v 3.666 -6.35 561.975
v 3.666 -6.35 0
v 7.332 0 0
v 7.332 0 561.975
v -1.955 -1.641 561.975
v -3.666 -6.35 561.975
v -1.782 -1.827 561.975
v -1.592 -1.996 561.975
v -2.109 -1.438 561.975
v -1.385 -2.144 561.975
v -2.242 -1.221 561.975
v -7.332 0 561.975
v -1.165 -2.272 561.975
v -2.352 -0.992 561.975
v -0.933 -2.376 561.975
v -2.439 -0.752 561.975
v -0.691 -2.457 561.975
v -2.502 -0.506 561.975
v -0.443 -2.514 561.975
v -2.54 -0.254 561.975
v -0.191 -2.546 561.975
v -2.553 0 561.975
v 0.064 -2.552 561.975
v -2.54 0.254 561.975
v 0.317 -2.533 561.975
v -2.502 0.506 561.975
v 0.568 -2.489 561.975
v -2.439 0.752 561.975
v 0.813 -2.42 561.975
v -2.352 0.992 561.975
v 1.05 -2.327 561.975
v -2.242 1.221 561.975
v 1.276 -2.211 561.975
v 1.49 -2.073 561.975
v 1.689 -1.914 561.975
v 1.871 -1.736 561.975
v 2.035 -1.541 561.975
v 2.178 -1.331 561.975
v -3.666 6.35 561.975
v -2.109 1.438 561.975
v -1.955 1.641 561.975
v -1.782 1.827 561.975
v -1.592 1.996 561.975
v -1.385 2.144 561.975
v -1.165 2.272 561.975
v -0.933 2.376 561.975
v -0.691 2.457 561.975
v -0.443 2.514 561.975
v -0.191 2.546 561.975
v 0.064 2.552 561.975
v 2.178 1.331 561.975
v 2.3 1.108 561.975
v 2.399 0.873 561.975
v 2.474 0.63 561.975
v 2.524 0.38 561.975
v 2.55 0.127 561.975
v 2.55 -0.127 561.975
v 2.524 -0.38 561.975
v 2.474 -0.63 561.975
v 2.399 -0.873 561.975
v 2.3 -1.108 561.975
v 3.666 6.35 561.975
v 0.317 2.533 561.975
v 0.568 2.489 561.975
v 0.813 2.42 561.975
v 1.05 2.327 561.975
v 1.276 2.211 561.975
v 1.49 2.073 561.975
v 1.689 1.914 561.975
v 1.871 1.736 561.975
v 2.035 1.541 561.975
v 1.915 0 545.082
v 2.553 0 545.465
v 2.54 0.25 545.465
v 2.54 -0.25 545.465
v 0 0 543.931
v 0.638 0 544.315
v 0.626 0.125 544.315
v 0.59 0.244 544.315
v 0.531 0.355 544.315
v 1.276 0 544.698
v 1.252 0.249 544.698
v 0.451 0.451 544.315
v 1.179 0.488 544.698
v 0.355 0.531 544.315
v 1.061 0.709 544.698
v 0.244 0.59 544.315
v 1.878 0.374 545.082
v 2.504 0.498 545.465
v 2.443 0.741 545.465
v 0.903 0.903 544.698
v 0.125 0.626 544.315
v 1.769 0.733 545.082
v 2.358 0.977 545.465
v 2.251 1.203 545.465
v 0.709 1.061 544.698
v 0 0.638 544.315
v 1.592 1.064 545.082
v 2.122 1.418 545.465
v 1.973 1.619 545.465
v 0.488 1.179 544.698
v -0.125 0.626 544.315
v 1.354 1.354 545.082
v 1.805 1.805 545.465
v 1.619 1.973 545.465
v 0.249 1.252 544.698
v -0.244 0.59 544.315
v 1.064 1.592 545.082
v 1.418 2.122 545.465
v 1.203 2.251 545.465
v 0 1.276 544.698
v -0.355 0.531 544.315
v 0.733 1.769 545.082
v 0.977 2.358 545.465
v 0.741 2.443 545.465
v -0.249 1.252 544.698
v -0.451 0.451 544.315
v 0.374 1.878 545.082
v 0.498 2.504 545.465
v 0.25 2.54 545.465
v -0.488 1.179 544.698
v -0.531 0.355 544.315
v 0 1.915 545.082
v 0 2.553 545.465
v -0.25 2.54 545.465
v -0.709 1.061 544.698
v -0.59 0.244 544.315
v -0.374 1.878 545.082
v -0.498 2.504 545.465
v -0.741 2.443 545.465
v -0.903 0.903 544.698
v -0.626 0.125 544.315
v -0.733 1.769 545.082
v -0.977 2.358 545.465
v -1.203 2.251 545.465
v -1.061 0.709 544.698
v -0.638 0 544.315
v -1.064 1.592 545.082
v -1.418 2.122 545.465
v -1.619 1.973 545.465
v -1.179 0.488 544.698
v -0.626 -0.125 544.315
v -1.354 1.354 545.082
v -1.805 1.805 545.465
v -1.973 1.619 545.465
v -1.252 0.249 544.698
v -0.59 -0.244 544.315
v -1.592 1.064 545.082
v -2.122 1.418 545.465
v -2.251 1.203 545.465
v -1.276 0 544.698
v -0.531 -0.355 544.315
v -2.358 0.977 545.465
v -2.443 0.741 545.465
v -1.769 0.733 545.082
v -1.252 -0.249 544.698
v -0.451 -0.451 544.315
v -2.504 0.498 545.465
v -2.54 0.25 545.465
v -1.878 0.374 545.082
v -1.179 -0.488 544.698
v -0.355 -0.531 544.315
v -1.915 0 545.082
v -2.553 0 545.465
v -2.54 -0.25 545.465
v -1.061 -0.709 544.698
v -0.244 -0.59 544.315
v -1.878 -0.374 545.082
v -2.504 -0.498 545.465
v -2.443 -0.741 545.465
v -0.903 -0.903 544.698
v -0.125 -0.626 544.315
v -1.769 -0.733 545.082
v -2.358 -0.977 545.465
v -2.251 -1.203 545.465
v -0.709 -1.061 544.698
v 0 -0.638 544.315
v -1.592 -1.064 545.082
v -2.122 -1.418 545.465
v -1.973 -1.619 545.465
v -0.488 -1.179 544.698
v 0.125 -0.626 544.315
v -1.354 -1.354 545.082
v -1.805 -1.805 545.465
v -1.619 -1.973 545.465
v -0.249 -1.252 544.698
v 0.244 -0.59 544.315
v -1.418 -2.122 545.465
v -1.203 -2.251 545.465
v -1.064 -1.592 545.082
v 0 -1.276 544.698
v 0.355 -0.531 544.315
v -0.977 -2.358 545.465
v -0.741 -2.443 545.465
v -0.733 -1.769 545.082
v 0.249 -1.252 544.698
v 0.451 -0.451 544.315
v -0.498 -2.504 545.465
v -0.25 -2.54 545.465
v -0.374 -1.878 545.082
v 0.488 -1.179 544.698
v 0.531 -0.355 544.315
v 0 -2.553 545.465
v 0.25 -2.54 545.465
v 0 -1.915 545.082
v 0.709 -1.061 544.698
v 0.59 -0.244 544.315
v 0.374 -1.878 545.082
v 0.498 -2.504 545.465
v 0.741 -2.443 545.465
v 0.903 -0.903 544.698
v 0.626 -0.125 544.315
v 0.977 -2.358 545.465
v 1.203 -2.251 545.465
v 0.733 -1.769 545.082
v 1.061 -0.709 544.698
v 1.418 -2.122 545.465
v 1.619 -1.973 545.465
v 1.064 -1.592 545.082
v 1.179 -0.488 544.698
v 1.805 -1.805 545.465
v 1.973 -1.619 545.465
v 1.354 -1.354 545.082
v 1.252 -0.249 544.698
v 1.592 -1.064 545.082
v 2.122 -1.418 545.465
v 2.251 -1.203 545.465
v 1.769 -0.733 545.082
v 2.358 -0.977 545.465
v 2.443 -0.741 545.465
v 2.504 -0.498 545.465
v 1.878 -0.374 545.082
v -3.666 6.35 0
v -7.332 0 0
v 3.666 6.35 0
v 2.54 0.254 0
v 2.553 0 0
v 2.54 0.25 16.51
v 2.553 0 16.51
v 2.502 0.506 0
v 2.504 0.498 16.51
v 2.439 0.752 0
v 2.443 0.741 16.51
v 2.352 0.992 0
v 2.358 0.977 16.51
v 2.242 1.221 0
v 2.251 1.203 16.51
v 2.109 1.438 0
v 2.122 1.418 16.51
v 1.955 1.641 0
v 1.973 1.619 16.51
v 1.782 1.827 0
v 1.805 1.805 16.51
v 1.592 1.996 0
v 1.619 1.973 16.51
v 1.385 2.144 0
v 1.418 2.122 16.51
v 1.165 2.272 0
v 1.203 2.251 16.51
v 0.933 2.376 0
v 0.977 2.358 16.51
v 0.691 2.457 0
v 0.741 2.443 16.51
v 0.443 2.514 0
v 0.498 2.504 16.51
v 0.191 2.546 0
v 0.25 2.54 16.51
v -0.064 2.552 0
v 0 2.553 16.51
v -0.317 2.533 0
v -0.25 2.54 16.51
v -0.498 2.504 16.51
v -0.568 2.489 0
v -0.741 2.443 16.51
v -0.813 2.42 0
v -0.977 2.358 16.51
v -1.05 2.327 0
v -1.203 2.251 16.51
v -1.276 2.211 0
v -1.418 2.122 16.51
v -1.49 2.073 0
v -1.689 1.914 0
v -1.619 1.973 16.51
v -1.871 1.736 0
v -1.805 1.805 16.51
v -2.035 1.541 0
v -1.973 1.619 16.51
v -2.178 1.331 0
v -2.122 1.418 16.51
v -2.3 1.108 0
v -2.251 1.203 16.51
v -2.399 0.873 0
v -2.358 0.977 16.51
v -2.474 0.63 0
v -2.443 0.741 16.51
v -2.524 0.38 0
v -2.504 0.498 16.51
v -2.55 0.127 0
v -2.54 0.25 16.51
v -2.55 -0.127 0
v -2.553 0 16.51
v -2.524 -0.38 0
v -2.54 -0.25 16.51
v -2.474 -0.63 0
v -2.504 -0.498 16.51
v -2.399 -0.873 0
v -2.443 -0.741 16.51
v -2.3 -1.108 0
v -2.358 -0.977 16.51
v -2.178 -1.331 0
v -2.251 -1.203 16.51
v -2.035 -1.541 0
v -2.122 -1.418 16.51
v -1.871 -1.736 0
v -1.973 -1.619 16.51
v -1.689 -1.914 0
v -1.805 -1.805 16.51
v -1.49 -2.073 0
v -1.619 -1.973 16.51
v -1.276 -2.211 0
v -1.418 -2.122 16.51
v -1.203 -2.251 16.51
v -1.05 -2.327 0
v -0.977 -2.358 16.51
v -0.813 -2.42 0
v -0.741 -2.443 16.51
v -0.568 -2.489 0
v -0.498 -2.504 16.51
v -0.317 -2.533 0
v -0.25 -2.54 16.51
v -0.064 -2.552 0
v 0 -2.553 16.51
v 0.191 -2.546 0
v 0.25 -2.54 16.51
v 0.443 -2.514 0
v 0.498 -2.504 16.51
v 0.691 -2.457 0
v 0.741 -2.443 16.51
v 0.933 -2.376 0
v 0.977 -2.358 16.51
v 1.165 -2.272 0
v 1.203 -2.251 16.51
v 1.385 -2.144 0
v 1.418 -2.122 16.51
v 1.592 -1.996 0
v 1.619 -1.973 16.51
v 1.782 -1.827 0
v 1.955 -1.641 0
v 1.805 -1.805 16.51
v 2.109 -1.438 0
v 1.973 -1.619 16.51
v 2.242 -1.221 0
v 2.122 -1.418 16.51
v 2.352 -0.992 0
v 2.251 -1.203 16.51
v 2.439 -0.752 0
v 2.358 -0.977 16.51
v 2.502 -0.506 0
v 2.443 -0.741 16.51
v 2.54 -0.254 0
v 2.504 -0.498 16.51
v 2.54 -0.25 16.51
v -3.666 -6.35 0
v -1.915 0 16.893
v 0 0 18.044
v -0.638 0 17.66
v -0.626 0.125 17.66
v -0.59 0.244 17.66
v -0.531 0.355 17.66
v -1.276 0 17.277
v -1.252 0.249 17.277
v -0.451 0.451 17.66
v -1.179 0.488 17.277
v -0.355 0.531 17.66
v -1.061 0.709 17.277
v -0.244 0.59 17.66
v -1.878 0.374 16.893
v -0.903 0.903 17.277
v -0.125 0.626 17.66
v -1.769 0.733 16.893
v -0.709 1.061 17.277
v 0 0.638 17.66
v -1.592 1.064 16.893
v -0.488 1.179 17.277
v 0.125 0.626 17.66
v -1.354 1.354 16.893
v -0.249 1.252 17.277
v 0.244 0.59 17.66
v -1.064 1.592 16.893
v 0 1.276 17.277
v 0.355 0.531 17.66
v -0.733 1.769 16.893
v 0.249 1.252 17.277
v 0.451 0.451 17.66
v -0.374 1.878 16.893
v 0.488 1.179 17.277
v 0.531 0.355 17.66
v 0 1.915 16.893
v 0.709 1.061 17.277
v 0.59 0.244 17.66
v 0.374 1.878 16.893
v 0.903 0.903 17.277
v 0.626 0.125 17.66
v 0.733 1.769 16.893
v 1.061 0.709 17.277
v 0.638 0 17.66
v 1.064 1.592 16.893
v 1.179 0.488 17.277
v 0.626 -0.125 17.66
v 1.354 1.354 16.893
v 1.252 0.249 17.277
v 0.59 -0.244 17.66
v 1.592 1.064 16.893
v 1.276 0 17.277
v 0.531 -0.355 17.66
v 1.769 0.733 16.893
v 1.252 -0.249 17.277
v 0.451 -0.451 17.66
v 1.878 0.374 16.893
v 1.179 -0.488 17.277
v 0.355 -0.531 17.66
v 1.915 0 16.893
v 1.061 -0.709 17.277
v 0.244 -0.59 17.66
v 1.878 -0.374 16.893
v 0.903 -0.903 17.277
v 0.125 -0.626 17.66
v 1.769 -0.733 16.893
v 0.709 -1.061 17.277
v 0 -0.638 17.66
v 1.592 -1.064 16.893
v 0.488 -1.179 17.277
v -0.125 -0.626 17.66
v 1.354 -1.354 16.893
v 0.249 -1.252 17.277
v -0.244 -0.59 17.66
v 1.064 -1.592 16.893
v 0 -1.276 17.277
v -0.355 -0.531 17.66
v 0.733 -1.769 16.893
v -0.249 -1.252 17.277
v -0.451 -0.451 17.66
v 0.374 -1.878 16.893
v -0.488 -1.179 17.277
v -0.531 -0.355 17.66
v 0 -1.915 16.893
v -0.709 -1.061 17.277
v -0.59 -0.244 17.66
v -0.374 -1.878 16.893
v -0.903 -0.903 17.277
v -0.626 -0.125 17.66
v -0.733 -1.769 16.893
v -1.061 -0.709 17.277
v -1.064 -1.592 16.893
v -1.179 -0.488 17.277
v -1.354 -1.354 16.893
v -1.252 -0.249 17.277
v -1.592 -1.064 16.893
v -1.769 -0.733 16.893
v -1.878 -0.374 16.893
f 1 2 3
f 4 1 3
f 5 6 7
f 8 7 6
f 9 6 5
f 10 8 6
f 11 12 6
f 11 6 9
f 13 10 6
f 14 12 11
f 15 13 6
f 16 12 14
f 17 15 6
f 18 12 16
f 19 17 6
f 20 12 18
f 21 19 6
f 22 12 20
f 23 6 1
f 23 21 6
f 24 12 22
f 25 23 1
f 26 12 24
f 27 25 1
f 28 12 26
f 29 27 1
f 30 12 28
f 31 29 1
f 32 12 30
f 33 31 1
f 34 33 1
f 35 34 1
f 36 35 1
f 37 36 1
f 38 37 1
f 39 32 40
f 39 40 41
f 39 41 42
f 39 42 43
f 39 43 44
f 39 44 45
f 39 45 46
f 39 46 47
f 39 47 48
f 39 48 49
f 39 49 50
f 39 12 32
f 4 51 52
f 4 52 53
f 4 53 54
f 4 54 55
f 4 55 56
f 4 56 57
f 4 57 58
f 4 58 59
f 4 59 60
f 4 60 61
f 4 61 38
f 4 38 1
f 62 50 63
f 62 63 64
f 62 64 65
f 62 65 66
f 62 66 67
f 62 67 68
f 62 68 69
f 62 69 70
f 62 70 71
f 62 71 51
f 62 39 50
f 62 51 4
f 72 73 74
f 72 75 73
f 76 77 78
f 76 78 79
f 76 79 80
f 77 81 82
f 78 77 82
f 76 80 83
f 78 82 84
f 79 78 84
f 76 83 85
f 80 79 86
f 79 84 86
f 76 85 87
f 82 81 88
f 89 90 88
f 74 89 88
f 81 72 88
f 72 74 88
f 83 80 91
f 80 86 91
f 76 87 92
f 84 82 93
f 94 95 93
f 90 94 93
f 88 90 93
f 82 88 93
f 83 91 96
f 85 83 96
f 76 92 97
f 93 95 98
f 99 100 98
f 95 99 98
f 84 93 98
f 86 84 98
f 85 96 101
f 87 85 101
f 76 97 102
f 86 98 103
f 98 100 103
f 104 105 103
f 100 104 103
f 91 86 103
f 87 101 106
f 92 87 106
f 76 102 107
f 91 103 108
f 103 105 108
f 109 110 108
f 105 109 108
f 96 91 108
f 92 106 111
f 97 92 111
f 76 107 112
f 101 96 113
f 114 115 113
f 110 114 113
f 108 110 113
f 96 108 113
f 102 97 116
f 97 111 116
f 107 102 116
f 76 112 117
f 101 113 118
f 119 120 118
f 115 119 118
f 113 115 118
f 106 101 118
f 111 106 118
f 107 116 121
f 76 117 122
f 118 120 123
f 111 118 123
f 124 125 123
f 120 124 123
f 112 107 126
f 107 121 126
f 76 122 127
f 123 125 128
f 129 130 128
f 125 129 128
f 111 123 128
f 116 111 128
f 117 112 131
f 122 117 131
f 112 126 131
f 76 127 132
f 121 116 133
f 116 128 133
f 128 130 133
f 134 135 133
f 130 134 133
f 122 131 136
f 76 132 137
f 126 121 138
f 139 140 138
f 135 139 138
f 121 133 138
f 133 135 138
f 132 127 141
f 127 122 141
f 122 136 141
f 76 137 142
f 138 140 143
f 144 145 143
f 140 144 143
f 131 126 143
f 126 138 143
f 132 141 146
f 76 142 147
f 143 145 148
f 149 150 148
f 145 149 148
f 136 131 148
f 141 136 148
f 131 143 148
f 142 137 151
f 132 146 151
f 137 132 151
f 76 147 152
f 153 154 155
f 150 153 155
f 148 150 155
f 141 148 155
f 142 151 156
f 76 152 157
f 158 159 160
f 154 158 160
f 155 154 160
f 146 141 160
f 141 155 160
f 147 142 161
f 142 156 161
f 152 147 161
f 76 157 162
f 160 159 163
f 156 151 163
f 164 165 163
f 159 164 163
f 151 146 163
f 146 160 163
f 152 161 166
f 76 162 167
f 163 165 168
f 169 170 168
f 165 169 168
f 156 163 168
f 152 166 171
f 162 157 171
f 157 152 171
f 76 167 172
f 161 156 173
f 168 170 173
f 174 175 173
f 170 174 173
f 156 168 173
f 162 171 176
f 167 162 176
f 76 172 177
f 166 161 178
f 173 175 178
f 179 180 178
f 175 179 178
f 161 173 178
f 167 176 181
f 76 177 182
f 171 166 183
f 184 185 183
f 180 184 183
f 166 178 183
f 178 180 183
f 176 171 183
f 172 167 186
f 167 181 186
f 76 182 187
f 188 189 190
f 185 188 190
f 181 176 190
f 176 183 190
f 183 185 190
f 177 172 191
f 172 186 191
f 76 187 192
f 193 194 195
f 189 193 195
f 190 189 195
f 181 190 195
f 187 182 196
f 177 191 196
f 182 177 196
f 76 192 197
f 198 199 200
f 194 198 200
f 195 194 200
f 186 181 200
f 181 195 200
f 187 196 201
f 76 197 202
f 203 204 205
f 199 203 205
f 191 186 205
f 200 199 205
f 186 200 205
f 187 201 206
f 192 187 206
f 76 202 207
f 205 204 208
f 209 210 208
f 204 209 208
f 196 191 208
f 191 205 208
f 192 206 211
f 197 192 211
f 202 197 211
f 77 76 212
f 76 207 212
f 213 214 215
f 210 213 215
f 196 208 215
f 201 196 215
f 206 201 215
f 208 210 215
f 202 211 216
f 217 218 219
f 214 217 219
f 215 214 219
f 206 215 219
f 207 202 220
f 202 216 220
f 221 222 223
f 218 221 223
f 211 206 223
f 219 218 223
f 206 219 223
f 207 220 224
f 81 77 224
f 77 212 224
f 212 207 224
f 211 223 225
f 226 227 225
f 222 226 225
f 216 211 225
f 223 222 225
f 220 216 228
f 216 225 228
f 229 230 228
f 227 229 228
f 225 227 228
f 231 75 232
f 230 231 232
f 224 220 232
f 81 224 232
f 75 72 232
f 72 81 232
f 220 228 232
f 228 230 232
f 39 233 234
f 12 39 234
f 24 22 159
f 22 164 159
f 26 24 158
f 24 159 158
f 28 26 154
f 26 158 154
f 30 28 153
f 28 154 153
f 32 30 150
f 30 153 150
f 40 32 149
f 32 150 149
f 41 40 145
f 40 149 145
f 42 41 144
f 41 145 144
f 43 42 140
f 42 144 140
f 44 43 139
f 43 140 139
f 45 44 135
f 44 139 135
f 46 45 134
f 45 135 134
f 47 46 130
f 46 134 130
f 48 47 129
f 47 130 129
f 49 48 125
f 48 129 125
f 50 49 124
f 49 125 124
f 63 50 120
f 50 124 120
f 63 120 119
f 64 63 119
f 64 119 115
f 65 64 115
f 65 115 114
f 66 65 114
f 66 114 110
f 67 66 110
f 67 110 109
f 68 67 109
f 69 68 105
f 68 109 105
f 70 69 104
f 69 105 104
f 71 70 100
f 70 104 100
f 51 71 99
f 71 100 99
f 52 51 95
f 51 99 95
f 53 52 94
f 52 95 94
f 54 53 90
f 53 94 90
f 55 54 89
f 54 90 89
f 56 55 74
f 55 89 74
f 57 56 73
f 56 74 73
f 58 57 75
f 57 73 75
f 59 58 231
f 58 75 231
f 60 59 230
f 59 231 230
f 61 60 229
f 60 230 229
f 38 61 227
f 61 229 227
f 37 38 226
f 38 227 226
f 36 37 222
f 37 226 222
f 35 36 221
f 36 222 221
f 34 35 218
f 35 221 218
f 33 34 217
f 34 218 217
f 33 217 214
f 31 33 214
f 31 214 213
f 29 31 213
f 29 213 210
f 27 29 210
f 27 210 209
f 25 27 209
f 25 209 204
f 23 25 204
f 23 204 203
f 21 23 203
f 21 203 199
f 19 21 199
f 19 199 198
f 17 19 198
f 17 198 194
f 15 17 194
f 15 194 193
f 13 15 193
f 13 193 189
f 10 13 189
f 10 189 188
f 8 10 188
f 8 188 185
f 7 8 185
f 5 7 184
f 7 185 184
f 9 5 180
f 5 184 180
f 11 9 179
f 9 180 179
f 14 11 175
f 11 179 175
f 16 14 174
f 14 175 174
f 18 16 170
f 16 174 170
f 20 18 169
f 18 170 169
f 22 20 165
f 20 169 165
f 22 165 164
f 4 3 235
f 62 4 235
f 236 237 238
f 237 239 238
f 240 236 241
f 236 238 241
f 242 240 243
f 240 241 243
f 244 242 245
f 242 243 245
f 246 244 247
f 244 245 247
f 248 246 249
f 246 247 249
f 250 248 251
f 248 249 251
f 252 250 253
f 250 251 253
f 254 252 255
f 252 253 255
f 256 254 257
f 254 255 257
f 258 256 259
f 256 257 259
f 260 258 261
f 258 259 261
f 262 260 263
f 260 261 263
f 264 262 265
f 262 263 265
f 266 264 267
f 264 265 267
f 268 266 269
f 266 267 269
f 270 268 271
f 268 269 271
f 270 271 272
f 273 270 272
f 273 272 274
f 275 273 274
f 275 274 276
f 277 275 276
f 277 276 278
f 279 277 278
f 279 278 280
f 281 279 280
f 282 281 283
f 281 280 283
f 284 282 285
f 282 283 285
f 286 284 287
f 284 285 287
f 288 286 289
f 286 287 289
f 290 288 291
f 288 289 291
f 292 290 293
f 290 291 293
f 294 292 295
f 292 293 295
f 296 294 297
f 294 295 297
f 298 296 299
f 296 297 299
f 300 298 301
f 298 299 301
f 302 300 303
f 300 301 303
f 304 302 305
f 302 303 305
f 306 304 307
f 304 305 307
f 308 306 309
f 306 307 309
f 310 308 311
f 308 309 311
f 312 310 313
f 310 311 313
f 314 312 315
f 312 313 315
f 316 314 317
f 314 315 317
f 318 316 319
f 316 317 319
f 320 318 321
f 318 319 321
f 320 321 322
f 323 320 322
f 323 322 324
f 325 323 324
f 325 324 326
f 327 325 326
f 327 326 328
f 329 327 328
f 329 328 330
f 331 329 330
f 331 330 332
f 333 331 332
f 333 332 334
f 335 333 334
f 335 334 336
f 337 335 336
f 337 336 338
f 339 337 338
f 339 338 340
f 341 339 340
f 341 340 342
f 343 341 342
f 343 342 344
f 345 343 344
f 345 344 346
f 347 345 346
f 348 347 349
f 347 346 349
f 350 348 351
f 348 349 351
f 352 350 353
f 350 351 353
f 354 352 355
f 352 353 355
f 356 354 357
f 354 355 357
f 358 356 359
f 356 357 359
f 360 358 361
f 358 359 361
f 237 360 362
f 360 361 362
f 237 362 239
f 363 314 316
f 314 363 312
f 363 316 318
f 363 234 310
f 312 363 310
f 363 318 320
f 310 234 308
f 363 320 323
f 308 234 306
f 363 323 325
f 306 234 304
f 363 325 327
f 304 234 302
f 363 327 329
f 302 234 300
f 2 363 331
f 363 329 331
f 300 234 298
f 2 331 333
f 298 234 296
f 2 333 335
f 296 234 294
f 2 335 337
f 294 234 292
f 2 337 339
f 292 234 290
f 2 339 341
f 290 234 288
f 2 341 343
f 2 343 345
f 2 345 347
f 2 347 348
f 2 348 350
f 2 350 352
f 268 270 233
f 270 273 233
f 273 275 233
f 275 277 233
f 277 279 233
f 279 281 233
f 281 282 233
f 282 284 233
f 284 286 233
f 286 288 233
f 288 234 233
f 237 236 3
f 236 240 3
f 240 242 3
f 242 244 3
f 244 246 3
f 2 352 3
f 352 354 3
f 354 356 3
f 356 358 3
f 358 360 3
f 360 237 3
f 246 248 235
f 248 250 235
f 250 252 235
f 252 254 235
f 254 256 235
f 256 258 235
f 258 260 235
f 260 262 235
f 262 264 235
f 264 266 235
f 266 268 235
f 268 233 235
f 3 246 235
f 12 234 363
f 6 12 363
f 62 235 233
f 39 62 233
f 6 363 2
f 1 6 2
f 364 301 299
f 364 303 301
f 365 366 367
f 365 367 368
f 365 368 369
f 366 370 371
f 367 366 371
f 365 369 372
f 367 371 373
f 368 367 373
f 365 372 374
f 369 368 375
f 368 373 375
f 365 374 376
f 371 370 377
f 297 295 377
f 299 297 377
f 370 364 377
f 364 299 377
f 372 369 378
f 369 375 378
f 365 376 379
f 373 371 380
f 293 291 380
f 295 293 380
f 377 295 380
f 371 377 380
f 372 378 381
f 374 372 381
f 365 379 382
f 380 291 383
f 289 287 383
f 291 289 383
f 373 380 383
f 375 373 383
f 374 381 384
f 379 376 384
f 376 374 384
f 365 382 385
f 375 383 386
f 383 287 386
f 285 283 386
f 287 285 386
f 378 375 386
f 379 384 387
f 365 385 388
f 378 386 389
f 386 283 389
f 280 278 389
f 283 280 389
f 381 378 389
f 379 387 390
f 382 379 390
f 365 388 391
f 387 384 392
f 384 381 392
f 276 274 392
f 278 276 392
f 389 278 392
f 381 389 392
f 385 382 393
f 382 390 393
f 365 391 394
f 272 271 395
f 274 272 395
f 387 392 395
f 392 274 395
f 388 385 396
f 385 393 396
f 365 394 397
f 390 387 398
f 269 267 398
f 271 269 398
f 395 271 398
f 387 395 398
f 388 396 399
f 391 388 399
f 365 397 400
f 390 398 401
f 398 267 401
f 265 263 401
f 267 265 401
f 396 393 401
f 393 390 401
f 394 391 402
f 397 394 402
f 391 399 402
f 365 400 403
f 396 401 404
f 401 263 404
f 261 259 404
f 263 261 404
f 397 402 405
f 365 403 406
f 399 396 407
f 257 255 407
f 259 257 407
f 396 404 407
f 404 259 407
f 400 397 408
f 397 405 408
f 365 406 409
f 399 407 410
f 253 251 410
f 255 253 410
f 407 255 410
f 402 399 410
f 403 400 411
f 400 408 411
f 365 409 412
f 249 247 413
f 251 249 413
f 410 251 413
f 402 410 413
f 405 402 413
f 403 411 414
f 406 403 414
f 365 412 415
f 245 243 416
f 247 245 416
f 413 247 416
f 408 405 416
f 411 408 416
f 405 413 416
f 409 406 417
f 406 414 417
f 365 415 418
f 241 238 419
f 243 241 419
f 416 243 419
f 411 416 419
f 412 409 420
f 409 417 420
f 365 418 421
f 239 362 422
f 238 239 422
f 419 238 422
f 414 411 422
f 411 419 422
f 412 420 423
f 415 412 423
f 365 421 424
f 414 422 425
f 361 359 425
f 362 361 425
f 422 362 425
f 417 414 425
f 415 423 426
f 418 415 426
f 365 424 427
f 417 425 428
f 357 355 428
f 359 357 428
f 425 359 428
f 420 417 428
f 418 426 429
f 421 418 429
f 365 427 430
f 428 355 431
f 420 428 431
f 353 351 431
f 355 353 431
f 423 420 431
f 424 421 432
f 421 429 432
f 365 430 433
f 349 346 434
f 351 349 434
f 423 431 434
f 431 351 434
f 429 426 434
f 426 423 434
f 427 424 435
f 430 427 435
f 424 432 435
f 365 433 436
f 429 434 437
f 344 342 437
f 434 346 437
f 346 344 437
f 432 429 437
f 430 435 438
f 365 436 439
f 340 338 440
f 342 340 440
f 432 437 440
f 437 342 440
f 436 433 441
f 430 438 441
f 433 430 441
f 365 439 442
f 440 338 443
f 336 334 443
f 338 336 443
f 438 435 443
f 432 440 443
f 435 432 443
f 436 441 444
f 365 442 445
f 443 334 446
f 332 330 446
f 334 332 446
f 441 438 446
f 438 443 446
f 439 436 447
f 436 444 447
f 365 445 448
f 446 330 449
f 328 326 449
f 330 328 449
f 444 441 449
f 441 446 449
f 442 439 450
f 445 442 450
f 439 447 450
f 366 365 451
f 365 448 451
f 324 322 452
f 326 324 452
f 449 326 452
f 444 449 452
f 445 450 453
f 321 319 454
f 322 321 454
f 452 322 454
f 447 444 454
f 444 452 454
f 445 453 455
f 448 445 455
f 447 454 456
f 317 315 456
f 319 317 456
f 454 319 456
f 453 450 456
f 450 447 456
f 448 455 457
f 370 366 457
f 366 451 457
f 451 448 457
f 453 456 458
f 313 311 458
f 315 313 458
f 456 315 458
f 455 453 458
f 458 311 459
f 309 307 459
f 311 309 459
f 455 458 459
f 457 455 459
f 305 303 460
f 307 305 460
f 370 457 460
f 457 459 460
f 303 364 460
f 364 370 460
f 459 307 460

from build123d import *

# Parameters (mm, degrees)
BOSS_EXTRUDE1_DEPTH         = 561.975
F_1_4_20_TAPPED_HOLE1_D     = 5.1054
F_1_4_20_TAPPED_HOLE1_DEPTH = 16.51
F_1_4_20_TAPPED_HOLE1_TIP   = 1.533816902
F_1_4_20_TAPPED_HOLE2_D     = 5.1054
F_1_4_20_TAPPED_HOLE2_DEPTH = 16.51
F_1_4_20_TAPPED_HOLE2_TIP   = 1.533816902


with BuildPart() as part:
    # Sketch1 → Boss-Extrude1 (new body)
    with BuildSketch(Plane.XY):
        Polygon((7.332348419, 0), (3.666174209, 6.35), (-3.666174209, 6.35), (-7.332348419, 0), (-3.666174209, -6.35), (3.666174209, -6.35), align=None)
    extrude(amount=BOSS_EXTRUDE1_DEPTH)

    # 1/4-20 Tapped Hole1
    with Locations(Plane.XY.offset(561.975)):
        with Locations((0, 0)):
            Hole(F_1_4_20_TAPPED_HOLE1_D / 2, depth=F_1_4_20_TAPPED_HOLE1_DEPTH)
            with Locations((0, 0, -(F_1_4_20_TAPPED_HOLE1_DEPTH + F_1_4_20_TAPPED_HOLE1_TIP / 2))):  # 118° drill point
                Cone(0, F_1_4_20_TAPPED_HOLE1_D / 2, F_1_4_20_TAPPED_HOLE1_TIP, mode=Mode.SUBTRACT)

    # 1/4-20 Tapped Hole2
    with Locations(Plane(origin=(0, 0, 0), x_dir=(-1, 0, 0), z_dir=(0, 0, -1))):
        with Locations((0, 0)):
            Hole(F_1_4_20_TAPPED_HOLE2_D / 2, depth=F_1_4_20_TAPPED_HOLE2_DEPTH)
            with Locations((0, 0, -(F_1_4_20_TAPPED_HOLE2_DEPTH + F_1_4_20_TAPPED_HOLE2_TIP / 2))):  # 118° drill point
                Cone(0, F_1_4_20_TAPPED_HOLE2_D / 2, F_1_4_20_TAPPED_HOLE2_TIP, mode=Mode.SUBTRACT)


solid = part.part
